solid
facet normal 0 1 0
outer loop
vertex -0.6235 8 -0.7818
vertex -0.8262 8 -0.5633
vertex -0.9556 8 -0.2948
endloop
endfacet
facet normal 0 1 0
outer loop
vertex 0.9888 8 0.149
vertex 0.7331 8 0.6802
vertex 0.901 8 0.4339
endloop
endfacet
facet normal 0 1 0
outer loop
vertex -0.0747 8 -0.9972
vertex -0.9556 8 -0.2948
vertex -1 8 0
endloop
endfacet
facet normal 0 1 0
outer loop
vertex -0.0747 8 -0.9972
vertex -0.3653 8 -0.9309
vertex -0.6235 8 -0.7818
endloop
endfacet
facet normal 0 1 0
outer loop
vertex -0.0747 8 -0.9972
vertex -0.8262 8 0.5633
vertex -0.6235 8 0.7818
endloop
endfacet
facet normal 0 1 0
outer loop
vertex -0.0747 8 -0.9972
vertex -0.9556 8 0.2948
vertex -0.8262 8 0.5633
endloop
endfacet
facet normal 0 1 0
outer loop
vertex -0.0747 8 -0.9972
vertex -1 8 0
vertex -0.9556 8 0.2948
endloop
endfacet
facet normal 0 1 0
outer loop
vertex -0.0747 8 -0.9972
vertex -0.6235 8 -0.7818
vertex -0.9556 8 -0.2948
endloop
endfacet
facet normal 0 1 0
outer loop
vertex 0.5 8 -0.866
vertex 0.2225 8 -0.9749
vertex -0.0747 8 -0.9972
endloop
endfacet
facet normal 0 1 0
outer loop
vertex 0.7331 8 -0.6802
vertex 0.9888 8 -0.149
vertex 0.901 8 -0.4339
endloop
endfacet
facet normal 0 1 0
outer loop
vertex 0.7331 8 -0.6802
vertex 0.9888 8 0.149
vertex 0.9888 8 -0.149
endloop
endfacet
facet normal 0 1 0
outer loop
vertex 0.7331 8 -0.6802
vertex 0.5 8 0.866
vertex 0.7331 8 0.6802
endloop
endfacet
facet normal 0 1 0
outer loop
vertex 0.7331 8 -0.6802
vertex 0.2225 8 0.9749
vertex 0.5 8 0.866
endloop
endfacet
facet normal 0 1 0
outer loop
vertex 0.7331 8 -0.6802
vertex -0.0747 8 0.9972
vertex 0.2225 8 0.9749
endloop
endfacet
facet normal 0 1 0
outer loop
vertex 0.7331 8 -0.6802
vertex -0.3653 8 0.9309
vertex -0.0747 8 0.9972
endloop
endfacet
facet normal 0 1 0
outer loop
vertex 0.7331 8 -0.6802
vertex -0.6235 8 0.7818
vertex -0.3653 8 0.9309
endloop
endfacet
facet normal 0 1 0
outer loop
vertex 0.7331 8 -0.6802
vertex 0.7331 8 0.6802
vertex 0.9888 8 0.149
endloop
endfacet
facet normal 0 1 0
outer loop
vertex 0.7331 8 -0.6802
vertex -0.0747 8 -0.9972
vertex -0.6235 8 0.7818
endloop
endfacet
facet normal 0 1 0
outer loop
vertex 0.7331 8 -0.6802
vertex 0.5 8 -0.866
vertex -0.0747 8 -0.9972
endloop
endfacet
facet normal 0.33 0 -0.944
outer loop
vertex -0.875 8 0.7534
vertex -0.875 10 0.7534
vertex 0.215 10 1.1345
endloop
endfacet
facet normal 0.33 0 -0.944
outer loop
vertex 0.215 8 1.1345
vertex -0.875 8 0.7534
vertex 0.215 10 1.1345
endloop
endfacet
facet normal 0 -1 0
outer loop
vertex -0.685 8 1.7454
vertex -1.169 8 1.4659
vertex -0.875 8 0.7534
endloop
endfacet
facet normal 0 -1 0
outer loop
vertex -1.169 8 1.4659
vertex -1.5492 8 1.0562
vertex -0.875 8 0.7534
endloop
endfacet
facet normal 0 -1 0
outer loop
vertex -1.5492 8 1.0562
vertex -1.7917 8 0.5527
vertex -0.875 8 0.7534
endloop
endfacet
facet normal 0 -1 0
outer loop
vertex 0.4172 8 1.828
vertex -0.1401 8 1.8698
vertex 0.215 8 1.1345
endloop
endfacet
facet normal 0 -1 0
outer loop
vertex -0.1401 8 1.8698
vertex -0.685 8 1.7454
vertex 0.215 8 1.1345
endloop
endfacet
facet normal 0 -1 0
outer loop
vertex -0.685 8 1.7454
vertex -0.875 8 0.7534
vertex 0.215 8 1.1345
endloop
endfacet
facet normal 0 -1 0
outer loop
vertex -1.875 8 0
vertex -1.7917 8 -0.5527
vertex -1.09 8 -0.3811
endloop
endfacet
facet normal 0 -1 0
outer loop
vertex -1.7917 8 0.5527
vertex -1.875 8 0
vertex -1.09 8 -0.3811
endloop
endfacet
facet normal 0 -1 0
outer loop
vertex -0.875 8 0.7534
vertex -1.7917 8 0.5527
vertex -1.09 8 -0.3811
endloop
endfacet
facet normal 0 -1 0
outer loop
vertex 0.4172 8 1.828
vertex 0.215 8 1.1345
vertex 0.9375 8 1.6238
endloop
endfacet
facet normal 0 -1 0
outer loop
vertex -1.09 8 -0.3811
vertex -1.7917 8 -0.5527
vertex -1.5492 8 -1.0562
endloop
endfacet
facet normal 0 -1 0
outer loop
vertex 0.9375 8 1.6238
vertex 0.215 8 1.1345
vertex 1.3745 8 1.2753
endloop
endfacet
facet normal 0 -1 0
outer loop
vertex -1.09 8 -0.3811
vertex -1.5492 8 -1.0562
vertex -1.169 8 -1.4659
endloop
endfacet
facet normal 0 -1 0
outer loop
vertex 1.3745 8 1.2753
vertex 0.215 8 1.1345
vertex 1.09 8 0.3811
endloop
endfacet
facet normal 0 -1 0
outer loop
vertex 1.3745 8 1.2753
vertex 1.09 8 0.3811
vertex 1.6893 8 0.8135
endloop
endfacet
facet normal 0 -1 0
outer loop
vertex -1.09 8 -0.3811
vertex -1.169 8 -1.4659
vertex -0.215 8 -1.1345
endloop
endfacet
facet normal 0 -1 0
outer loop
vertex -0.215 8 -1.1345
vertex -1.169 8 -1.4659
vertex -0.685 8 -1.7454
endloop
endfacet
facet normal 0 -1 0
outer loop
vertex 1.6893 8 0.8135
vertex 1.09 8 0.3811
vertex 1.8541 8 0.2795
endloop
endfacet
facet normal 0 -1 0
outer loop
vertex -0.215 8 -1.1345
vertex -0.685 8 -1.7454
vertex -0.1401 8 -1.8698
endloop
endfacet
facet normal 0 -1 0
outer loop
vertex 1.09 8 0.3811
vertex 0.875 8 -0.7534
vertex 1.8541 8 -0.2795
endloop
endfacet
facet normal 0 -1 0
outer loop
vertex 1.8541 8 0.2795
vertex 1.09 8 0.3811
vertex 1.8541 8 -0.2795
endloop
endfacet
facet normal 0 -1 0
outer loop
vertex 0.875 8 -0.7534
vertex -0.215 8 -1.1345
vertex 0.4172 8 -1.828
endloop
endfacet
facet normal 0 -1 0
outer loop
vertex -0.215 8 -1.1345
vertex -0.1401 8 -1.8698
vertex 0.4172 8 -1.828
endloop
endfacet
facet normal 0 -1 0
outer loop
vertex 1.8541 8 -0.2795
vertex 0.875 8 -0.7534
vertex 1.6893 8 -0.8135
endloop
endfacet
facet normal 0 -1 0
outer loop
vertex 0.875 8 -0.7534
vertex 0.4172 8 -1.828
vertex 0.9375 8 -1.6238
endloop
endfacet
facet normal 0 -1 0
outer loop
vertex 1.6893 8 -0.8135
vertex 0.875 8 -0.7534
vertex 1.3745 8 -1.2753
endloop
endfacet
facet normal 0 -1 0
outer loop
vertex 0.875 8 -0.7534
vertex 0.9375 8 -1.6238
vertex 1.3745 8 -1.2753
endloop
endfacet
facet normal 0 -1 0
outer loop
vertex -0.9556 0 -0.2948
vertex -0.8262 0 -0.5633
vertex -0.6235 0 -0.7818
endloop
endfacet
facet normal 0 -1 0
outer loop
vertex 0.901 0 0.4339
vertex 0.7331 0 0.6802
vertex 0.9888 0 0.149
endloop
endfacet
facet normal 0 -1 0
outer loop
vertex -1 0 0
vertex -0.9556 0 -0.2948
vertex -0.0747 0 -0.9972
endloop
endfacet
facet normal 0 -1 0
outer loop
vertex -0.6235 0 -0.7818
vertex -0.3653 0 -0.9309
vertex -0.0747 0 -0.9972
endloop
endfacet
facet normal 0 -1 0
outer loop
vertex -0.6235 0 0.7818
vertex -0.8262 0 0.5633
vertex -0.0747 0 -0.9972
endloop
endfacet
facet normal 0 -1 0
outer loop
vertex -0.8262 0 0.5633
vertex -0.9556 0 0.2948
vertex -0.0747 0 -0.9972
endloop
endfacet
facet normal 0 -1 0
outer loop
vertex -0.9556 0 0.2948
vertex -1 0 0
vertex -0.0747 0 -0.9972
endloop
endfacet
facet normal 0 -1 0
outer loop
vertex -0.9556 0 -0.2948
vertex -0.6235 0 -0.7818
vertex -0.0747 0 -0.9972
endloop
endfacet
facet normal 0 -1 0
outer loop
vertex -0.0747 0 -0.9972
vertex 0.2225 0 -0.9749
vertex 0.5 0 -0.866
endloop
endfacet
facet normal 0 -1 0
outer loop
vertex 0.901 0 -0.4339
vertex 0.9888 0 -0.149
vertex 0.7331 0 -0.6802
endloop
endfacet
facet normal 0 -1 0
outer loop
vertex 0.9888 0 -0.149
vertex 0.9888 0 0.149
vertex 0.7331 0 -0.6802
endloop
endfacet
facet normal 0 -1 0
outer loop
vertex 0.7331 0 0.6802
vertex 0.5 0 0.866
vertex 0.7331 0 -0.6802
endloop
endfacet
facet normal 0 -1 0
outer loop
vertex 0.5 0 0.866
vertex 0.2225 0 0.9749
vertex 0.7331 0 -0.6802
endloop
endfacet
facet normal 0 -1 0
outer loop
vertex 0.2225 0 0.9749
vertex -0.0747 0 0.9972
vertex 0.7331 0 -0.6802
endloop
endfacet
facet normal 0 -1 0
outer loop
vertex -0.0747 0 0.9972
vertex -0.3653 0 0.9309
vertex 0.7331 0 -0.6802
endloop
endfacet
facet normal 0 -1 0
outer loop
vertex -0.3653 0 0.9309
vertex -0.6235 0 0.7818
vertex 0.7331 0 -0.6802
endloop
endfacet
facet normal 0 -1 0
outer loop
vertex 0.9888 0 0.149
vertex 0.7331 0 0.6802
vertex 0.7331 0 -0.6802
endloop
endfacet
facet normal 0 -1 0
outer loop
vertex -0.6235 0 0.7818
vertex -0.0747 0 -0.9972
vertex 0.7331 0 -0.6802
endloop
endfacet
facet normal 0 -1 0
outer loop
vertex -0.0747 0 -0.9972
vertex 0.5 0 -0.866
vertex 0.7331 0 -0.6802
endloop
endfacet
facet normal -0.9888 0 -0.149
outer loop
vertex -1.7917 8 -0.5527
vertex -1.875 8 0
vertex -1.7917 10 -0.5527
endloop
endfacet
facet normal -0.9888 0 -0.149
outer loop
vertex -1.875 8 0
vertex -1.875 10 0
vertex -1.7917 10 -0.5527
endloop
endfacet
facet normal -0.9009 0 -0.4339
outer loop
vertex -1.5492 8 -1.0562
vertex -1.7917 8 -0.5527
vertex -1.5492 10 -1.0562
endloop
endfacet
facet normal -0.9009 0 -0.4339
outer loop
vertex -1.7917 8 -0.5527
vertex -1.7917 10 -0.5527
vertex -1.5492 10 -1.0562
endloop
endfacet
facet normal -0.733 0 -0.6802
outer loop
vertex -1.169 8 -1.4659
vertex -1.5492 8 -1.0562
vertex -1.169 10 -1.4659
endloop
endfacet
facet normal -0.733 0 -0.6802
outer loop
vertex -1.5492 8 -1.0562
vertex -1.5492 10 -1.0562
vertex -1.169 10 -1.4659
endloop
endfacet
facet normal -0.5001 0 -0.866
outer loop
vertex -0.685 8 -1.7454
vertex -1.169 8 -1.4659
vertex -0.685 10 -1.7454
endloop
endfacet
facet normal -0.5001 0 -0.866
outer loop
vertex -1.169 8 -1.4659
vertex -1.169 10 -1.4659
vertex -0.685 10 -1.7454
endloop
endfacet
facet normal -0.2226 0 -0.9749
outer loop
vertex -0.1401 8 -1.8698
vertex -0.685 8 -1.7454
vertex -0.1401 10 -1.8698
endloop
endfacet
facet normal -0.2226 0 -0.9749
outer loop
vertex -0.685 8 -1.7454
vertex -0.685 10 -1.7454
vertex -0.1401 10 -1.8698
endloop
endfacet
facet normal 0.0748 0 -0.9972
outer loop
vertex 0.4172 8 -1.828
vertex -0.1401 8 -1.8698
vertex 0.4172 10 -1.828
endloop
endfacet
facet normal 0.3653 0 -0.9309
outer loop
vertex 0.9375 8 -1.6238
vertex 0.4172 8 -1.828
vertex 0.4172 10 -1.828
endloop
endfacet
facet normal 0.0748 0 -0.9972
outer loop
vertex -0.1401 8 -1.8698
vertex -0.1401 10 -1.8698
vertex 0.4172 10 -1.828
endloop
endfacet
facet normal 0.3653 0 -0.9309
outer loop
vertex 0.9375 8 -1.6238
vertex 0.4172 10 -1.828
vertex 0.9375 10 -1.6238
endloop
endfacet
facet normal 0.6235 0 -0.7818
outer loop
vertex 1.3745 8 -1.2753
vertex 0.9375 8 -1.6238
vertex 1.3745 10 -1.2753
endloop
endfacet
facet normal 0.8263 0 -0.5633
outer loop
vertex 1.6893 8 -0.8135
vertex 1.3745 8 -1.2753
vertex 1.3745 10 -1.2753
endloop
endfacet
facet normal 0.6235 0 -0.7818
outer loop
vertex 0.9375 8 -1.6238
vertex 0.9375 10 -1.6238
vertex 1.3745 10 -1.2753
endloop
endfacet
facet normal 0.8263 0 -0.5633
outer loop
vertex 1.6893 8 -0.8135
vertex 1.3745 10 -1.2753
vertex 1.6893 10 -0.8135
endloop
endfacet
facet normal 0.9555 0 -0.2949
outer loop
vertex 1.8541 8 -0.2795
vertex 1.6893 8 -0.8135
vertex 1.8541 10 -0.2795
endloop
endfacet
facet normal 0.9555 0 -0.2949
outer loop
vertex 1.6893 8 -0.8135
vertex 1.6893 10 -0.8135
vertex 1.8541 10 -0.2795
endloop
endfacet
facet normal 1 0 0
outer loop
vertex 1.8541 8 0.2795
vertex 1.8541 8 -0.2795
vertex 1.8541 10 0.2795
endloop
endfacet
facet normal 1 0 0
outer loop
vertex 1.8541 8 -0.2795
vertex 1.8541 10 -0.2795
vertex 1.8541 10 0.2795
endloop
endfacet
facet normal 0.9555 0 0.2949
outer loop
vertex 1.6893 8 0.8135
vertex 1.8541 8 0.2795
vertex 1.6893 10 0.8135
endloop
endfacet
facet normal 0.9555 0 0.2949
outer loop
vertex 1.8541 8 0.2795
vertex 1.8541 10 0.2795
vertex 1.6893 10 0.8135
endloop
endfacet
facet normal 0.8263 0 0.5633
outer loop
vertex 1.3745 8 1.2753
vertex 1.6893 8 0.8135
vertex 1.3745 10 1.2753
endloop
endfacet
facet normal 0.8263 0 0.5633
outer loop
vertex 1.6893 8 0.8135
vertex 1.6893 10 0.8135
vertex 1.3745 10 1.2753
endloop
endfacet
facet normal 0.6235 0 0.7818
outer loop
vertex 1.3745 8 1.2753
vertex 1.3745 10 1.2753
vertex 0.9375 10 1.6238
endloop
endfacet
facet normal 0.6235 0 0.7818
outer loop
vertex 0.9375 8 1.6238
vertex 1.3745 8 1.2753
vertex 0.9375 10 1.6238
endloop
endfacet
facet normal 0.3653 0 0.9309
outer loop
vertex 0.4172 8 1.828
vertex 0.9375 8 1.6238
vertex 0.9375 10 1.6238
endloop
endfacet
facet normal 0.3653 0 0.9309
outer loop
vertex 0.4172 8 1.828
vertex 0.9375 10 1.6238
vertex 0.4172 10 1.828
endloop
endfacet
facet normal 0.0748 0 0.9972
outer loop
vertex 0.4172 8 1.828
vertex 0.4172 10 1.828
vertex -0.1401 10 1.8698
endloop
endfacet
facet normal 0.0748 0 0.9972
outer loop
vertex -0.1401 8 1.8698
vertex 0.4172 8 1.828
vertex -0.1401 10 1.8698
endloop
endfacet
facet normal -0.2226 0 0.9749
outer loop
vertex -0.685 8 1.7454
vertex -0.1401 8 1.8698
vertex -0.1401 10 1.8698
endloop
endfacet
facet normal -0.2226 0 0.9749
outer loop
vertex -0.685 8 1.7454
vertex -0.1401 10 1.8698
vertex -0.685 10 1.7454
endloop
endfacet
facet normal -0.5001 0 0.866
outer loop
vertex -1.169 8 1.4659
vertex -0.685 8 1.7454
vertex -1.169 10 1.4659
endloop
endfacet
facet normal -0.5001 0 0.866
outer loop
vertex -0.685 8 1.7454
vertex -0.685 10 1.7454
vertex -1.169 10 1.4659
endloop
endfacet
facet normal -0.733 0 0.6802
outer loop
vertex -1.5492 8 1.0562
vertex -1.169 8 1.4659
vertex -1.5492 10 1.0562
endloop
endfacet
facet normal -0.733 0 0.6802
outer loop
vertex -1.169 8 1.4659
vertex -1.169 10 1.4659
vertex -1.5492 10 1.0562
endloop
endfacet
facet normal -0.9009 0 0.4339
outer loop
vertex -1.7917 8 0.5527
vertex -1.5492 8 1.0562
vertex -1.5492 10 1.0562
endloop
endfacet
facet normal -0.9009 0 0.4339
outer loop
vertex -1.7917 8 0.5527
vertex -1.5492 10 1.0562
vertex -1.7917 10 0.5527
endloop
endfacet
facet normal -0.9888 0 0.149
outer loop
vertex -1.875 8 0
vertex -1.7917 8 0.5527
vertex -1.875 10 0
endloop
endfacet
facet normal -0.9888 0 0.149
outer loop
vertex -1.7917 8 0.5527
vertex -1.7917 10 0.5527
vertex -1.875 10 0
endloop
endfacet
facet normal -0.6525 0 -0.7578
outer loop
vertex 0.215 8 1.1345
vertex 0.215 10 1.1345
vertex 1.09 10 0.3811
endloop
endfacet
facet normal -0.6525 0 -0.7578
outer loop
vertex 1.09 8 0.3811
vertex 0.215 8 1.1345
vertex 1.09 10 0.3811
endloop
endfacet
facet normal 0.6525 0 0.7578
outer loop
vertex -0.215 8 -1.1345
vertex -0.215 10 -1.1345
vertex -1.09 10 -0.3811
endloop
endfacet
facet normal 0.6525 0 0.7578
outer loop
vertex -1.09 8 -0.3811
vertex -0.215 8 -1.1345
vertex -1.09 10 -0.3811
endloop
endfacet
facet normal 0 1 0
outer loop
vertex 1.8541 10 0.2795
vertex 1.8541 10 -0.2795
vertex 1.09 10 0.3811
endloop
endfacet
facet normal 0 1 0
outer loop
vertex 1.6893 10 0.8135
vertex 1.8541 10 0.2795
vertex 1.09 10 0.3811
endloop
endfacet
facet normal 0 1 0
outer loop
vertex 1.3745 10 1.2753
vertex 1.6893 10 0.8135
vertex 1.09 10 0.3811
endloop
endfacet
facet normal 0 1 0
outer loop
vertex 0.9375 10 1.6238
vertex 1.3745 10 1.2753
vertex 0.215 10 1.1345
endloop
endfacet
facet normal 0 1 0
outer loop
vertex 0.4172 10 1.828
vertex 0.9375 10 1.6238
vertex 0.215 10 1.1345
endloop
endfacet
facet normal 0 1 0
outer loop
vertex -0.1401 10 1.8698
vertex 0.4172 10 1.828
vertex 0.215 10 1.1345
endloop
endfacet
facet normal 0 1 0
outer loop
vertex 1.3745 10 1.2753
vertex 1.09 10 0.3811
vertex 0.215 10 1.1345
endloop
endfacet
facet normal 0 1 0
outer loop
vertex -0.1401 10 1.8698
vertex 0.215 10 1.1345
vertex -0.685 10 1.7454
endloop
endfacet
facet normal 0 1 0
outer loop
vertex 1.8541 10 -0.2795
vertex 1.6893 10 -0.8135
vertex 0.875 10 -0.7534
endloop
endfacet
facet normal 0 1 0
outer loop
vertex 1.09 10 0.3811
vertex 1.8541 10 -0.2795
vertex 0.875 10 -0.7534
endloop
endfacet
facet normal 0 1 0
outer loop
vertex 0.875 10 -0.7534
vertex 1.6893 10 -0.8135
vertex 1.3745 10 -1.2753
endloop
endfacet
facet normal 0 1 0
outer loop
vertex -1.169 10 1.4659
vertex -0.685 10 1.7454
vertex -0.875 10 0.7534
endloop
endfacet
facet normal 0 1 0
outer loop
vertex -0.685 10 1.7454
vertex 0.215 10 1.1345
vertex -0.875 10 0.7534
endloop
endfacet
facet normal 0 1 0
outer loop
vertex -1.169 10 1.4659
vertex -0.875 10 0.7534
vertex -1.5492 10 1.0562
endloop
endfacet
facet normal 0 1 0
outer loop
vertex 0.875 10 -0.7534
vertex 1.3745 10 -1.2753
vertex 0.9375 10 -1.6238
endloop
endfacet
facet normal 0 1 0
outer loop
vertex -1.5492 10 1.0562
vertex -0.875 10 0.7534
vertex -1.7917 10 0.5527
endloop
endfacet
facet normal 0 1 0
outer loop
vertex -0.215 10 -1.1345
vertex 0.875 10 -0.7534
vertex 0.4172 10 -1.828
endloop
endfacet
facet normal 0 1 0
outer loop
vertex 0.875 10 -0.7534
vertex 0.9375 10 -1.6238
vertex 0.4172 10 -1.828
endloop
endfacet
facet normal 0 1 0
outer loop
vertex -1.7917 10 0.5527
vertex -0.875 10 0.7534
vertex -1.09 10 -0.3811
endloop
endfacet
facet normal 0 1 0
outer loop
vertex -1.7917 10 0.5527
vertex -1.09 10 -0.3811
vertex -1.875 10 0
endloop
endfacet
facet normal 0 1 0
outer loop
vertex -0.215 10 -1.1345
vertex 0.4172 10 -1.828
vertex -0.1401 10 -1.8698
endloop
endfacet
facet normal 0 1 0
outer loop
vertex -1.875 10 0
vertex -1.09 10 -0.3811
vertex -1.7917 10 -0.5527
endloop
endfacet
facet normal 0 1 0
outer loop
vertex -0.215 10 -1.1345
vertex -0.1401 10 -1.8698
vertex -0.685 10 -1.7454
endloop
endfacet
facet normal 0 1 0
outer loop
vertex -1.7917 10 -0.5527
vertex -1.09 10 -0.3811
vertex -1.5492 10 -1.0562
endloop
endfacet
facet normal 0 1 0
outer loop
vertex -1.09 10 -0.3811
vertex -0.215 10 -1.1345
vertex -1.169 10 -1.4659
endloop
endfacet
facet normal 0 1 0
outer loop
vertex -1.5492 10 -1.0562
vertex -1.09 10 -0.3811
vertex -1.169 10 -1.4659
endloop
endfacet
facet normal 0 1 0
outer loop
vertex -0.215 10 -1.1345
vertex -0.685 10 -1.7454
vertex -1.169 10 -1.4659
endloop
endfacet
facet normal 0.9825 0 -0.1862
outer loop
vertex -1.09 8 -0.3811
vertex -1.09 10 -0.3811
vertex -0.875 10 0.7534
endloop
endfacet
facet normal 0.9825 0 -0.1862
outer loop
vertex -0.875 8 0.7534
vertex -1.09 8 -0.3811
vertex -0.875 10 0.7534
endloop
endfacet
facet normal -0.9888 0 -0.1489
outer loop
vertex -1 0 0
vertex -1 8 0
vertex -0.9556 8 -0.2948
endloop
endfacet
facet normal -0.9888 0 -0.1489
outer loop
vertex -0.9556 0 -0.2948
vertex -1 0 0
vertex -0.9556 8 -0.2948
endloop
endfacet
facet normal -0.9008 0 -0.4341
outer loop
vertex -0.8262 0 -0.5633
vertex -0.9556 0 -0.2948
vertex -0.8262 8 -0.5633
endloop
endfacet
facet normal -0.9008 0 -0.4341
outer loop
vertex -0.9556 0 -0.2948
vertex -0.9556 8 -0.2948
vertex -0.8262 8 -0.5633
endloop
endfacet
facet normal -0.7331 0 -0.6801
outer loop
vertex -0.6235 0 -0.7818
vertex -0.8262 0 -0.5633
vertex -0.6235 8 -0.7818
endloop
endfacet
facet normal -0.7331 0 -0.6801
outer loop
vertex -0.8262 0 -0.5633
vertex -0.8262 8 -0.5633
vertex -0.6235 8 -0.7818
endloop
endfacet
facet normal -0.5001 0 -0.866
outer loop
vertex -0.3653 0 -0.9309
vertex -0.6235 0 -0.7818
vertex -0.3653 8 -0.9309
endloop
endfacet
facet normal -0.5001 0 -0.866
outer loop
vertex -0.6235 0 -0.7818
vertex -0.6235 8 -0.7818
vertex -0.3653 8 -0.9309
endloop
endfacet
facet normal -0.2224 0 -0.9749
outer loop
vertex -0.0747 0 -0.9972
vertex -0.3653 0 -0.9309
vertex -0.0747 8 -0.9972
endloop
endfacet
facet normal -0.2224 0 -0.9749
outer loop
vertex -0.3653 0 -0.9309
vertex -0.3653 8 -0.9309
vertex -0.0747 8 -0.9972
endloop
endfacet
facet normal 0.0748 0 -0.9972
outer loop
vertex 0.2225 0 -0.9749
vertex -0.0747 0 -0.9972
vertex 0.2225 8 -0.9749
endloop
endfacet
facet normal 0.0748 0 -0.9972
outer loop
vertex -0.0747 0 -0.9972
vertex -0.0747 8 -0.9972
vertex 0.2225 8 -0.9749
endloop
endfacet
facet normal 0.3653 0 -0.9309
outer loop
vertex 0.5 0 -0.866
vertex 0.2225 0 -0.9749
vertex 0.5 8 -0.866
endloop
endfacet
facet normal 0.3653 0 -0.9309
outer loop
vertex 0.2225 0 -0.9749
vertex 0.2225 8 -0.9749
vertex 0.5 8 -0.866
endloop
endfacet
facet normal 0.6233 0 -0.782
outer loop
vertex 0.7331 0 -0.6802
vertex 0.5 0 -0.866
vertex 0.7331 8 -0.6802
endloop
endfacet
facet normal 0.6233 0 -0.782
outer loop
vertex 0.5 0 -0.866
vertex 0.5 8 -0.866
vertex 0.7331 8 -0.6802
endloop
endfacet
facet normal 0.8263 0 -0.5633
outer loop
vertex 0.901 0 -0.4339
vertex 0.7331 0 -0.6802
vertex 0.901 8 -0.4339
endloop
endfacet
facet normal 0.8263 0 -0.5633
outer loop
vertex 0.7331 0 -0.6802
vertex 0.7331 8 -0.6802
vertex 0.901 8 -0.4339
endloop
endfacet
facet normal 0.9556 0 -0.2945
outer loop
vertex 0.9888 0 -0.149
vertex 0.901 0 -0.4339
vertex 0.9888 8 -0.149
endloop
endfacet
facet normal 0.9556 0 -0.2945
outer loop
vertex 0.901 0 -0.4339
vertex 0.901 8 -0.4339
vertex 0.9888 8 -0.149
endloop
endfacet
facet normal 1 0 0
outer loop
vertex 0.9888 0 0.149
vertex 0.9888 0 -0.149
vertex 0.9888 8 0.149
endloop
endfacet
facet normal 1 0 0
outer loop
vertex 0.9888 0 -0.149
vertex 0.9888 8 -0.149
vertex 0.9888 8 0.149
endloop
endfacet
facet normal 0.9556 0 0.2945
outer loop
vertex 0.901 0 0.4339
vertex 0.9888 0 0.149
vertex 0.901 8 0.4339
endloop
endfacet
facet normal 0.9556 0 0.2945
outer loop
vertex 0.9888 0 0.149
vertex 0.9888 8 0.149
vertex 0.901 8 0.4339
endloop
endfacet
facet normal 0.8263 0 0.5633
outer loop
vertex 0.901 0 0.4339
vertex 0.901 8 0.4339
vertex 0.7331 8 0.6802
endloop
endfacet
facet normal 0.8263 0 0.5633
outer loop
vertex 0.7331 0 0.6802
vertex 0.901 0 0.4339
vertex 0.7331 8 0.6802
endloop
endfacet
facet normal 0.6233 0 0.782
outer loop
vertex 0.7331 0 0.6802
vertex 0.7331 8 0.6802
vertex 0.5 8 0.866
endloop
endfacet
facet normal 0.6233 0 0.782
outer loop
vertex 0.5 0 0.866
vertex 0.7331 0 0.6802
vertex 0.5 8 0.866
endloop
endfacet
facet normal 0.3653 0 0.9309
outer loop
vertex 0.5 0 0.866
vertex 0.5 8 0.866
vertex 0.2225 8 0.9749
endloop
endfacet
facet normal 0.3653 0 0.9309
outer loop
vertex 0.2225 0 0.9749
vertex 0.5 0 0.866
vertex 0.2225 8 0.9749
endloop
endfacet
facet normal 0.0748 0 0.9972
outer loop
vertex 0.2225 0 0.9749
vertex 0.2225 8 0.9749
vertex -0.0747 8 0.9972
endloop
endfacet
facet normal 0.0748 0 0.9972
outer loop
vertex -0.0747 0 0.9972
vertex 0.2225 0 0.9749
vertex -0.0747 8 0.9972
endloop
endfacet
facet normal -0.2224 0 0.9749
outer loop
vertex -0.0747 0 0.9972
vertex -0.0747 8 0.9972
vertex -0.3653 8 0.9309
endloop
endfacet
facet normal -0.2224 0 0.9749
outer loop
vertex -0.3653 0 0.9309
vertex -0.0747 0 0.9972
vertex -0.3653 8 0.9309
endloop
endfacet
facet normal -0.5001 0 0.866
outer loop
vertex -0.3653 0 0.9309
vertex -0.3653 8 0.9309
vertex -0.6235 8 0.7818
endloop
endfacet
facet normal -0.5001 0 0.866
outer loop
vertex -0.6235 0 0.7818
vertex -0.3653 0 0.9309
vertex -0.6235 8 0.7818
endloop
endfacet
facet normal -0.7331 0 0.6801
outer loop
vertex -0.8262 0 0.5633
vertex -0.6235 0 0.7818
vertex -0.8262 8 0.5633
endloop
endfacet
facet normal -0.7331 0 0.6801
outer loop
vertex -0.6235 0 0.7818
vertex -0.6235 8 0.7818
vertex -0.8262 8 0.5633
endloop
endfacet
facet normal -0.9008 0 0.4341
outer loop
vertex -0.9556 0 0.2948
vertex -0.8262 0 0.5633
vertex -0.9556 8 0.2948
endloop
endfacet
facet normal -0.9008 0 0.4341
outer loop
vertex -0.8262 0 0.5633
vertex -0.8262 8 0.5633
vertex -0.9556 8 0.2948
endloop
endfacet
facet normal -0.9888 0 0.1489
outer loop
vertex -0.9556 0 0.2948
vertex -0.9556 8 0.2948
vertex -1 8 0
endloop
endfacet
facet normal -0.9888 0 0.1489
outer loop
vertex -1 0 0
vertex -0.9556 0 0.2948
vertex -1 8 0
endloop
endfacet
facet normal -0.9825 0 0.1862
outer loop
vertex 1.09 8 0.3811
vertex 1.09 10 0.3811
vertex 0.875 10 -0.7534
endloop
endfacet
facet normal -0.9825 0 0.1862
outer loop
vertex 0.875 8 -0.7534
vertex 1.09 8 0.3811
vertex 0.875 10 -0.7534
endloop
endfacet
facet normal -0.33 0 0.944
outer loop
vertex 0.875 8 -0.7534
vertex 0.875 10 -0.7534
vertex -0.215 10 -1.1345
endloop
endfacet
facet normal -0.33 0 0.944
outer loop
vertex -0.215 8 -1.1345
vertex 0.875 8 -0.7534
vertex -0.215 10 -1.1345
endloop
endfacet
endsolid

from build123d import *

# Parameters (mm, degrees)
CORTAR_EXTRUIR1_DEPTH = 2


with BuildPart() as part:
    # Croquis1 → Revolución1 (revolve)
    with BuildSketch(Plane.XY):
        Polygon((0, 0), (-1, 0), (-1, 8), (-1.875, 8), (-1.875, 10), (-0.515646635, 10), (-0.515646635, 8.322225361), (0, 8.322225361), align=None)
    revolve(axis=Axis((0, 8.322225361, 0), (0, -1, 0)))

    # Croquis2 → Cortar-Extruir1 (cut)
    with BuildSketch(Plane(origin=(0, 10, 0), x_dir=(1, 0, 0), z_dir=(0, 1, 0))):
        Polygon((0.875027781, 0.753431958), (-0.214977325, 1.134512267), (-1.090005106, 0.381080309), (-0.875027781, -0.753431958), (0.214977325, -1.134512267), (1.090005106, -0.381080309), align=None)
    extrude(amount=-CORTAR_EXTRUIR1_DEPTH, mode=Mode.SUBTRACT)


with BuildPart() as cortar_extruir1_piece_1:
    # of the separate pieces the step leaves, piece 1, a body of its own (cortar_extruir1_pieces)
    add(part.part.solids().sort_by_distance((-1, 0, 0))[0])


with BuildPart() as cortar_extruir1_piece_2:
    # of the separate pieces the step leaves, piece 2, a body of its own (cortar_extruir1_pieces)
    add(part.part.solids().sort_by_distance((-1.875, 8, 0))[0])


solid = Compound([cortar_extruir1_piece_1.part, cortar_extruir1_piece_2.part])
